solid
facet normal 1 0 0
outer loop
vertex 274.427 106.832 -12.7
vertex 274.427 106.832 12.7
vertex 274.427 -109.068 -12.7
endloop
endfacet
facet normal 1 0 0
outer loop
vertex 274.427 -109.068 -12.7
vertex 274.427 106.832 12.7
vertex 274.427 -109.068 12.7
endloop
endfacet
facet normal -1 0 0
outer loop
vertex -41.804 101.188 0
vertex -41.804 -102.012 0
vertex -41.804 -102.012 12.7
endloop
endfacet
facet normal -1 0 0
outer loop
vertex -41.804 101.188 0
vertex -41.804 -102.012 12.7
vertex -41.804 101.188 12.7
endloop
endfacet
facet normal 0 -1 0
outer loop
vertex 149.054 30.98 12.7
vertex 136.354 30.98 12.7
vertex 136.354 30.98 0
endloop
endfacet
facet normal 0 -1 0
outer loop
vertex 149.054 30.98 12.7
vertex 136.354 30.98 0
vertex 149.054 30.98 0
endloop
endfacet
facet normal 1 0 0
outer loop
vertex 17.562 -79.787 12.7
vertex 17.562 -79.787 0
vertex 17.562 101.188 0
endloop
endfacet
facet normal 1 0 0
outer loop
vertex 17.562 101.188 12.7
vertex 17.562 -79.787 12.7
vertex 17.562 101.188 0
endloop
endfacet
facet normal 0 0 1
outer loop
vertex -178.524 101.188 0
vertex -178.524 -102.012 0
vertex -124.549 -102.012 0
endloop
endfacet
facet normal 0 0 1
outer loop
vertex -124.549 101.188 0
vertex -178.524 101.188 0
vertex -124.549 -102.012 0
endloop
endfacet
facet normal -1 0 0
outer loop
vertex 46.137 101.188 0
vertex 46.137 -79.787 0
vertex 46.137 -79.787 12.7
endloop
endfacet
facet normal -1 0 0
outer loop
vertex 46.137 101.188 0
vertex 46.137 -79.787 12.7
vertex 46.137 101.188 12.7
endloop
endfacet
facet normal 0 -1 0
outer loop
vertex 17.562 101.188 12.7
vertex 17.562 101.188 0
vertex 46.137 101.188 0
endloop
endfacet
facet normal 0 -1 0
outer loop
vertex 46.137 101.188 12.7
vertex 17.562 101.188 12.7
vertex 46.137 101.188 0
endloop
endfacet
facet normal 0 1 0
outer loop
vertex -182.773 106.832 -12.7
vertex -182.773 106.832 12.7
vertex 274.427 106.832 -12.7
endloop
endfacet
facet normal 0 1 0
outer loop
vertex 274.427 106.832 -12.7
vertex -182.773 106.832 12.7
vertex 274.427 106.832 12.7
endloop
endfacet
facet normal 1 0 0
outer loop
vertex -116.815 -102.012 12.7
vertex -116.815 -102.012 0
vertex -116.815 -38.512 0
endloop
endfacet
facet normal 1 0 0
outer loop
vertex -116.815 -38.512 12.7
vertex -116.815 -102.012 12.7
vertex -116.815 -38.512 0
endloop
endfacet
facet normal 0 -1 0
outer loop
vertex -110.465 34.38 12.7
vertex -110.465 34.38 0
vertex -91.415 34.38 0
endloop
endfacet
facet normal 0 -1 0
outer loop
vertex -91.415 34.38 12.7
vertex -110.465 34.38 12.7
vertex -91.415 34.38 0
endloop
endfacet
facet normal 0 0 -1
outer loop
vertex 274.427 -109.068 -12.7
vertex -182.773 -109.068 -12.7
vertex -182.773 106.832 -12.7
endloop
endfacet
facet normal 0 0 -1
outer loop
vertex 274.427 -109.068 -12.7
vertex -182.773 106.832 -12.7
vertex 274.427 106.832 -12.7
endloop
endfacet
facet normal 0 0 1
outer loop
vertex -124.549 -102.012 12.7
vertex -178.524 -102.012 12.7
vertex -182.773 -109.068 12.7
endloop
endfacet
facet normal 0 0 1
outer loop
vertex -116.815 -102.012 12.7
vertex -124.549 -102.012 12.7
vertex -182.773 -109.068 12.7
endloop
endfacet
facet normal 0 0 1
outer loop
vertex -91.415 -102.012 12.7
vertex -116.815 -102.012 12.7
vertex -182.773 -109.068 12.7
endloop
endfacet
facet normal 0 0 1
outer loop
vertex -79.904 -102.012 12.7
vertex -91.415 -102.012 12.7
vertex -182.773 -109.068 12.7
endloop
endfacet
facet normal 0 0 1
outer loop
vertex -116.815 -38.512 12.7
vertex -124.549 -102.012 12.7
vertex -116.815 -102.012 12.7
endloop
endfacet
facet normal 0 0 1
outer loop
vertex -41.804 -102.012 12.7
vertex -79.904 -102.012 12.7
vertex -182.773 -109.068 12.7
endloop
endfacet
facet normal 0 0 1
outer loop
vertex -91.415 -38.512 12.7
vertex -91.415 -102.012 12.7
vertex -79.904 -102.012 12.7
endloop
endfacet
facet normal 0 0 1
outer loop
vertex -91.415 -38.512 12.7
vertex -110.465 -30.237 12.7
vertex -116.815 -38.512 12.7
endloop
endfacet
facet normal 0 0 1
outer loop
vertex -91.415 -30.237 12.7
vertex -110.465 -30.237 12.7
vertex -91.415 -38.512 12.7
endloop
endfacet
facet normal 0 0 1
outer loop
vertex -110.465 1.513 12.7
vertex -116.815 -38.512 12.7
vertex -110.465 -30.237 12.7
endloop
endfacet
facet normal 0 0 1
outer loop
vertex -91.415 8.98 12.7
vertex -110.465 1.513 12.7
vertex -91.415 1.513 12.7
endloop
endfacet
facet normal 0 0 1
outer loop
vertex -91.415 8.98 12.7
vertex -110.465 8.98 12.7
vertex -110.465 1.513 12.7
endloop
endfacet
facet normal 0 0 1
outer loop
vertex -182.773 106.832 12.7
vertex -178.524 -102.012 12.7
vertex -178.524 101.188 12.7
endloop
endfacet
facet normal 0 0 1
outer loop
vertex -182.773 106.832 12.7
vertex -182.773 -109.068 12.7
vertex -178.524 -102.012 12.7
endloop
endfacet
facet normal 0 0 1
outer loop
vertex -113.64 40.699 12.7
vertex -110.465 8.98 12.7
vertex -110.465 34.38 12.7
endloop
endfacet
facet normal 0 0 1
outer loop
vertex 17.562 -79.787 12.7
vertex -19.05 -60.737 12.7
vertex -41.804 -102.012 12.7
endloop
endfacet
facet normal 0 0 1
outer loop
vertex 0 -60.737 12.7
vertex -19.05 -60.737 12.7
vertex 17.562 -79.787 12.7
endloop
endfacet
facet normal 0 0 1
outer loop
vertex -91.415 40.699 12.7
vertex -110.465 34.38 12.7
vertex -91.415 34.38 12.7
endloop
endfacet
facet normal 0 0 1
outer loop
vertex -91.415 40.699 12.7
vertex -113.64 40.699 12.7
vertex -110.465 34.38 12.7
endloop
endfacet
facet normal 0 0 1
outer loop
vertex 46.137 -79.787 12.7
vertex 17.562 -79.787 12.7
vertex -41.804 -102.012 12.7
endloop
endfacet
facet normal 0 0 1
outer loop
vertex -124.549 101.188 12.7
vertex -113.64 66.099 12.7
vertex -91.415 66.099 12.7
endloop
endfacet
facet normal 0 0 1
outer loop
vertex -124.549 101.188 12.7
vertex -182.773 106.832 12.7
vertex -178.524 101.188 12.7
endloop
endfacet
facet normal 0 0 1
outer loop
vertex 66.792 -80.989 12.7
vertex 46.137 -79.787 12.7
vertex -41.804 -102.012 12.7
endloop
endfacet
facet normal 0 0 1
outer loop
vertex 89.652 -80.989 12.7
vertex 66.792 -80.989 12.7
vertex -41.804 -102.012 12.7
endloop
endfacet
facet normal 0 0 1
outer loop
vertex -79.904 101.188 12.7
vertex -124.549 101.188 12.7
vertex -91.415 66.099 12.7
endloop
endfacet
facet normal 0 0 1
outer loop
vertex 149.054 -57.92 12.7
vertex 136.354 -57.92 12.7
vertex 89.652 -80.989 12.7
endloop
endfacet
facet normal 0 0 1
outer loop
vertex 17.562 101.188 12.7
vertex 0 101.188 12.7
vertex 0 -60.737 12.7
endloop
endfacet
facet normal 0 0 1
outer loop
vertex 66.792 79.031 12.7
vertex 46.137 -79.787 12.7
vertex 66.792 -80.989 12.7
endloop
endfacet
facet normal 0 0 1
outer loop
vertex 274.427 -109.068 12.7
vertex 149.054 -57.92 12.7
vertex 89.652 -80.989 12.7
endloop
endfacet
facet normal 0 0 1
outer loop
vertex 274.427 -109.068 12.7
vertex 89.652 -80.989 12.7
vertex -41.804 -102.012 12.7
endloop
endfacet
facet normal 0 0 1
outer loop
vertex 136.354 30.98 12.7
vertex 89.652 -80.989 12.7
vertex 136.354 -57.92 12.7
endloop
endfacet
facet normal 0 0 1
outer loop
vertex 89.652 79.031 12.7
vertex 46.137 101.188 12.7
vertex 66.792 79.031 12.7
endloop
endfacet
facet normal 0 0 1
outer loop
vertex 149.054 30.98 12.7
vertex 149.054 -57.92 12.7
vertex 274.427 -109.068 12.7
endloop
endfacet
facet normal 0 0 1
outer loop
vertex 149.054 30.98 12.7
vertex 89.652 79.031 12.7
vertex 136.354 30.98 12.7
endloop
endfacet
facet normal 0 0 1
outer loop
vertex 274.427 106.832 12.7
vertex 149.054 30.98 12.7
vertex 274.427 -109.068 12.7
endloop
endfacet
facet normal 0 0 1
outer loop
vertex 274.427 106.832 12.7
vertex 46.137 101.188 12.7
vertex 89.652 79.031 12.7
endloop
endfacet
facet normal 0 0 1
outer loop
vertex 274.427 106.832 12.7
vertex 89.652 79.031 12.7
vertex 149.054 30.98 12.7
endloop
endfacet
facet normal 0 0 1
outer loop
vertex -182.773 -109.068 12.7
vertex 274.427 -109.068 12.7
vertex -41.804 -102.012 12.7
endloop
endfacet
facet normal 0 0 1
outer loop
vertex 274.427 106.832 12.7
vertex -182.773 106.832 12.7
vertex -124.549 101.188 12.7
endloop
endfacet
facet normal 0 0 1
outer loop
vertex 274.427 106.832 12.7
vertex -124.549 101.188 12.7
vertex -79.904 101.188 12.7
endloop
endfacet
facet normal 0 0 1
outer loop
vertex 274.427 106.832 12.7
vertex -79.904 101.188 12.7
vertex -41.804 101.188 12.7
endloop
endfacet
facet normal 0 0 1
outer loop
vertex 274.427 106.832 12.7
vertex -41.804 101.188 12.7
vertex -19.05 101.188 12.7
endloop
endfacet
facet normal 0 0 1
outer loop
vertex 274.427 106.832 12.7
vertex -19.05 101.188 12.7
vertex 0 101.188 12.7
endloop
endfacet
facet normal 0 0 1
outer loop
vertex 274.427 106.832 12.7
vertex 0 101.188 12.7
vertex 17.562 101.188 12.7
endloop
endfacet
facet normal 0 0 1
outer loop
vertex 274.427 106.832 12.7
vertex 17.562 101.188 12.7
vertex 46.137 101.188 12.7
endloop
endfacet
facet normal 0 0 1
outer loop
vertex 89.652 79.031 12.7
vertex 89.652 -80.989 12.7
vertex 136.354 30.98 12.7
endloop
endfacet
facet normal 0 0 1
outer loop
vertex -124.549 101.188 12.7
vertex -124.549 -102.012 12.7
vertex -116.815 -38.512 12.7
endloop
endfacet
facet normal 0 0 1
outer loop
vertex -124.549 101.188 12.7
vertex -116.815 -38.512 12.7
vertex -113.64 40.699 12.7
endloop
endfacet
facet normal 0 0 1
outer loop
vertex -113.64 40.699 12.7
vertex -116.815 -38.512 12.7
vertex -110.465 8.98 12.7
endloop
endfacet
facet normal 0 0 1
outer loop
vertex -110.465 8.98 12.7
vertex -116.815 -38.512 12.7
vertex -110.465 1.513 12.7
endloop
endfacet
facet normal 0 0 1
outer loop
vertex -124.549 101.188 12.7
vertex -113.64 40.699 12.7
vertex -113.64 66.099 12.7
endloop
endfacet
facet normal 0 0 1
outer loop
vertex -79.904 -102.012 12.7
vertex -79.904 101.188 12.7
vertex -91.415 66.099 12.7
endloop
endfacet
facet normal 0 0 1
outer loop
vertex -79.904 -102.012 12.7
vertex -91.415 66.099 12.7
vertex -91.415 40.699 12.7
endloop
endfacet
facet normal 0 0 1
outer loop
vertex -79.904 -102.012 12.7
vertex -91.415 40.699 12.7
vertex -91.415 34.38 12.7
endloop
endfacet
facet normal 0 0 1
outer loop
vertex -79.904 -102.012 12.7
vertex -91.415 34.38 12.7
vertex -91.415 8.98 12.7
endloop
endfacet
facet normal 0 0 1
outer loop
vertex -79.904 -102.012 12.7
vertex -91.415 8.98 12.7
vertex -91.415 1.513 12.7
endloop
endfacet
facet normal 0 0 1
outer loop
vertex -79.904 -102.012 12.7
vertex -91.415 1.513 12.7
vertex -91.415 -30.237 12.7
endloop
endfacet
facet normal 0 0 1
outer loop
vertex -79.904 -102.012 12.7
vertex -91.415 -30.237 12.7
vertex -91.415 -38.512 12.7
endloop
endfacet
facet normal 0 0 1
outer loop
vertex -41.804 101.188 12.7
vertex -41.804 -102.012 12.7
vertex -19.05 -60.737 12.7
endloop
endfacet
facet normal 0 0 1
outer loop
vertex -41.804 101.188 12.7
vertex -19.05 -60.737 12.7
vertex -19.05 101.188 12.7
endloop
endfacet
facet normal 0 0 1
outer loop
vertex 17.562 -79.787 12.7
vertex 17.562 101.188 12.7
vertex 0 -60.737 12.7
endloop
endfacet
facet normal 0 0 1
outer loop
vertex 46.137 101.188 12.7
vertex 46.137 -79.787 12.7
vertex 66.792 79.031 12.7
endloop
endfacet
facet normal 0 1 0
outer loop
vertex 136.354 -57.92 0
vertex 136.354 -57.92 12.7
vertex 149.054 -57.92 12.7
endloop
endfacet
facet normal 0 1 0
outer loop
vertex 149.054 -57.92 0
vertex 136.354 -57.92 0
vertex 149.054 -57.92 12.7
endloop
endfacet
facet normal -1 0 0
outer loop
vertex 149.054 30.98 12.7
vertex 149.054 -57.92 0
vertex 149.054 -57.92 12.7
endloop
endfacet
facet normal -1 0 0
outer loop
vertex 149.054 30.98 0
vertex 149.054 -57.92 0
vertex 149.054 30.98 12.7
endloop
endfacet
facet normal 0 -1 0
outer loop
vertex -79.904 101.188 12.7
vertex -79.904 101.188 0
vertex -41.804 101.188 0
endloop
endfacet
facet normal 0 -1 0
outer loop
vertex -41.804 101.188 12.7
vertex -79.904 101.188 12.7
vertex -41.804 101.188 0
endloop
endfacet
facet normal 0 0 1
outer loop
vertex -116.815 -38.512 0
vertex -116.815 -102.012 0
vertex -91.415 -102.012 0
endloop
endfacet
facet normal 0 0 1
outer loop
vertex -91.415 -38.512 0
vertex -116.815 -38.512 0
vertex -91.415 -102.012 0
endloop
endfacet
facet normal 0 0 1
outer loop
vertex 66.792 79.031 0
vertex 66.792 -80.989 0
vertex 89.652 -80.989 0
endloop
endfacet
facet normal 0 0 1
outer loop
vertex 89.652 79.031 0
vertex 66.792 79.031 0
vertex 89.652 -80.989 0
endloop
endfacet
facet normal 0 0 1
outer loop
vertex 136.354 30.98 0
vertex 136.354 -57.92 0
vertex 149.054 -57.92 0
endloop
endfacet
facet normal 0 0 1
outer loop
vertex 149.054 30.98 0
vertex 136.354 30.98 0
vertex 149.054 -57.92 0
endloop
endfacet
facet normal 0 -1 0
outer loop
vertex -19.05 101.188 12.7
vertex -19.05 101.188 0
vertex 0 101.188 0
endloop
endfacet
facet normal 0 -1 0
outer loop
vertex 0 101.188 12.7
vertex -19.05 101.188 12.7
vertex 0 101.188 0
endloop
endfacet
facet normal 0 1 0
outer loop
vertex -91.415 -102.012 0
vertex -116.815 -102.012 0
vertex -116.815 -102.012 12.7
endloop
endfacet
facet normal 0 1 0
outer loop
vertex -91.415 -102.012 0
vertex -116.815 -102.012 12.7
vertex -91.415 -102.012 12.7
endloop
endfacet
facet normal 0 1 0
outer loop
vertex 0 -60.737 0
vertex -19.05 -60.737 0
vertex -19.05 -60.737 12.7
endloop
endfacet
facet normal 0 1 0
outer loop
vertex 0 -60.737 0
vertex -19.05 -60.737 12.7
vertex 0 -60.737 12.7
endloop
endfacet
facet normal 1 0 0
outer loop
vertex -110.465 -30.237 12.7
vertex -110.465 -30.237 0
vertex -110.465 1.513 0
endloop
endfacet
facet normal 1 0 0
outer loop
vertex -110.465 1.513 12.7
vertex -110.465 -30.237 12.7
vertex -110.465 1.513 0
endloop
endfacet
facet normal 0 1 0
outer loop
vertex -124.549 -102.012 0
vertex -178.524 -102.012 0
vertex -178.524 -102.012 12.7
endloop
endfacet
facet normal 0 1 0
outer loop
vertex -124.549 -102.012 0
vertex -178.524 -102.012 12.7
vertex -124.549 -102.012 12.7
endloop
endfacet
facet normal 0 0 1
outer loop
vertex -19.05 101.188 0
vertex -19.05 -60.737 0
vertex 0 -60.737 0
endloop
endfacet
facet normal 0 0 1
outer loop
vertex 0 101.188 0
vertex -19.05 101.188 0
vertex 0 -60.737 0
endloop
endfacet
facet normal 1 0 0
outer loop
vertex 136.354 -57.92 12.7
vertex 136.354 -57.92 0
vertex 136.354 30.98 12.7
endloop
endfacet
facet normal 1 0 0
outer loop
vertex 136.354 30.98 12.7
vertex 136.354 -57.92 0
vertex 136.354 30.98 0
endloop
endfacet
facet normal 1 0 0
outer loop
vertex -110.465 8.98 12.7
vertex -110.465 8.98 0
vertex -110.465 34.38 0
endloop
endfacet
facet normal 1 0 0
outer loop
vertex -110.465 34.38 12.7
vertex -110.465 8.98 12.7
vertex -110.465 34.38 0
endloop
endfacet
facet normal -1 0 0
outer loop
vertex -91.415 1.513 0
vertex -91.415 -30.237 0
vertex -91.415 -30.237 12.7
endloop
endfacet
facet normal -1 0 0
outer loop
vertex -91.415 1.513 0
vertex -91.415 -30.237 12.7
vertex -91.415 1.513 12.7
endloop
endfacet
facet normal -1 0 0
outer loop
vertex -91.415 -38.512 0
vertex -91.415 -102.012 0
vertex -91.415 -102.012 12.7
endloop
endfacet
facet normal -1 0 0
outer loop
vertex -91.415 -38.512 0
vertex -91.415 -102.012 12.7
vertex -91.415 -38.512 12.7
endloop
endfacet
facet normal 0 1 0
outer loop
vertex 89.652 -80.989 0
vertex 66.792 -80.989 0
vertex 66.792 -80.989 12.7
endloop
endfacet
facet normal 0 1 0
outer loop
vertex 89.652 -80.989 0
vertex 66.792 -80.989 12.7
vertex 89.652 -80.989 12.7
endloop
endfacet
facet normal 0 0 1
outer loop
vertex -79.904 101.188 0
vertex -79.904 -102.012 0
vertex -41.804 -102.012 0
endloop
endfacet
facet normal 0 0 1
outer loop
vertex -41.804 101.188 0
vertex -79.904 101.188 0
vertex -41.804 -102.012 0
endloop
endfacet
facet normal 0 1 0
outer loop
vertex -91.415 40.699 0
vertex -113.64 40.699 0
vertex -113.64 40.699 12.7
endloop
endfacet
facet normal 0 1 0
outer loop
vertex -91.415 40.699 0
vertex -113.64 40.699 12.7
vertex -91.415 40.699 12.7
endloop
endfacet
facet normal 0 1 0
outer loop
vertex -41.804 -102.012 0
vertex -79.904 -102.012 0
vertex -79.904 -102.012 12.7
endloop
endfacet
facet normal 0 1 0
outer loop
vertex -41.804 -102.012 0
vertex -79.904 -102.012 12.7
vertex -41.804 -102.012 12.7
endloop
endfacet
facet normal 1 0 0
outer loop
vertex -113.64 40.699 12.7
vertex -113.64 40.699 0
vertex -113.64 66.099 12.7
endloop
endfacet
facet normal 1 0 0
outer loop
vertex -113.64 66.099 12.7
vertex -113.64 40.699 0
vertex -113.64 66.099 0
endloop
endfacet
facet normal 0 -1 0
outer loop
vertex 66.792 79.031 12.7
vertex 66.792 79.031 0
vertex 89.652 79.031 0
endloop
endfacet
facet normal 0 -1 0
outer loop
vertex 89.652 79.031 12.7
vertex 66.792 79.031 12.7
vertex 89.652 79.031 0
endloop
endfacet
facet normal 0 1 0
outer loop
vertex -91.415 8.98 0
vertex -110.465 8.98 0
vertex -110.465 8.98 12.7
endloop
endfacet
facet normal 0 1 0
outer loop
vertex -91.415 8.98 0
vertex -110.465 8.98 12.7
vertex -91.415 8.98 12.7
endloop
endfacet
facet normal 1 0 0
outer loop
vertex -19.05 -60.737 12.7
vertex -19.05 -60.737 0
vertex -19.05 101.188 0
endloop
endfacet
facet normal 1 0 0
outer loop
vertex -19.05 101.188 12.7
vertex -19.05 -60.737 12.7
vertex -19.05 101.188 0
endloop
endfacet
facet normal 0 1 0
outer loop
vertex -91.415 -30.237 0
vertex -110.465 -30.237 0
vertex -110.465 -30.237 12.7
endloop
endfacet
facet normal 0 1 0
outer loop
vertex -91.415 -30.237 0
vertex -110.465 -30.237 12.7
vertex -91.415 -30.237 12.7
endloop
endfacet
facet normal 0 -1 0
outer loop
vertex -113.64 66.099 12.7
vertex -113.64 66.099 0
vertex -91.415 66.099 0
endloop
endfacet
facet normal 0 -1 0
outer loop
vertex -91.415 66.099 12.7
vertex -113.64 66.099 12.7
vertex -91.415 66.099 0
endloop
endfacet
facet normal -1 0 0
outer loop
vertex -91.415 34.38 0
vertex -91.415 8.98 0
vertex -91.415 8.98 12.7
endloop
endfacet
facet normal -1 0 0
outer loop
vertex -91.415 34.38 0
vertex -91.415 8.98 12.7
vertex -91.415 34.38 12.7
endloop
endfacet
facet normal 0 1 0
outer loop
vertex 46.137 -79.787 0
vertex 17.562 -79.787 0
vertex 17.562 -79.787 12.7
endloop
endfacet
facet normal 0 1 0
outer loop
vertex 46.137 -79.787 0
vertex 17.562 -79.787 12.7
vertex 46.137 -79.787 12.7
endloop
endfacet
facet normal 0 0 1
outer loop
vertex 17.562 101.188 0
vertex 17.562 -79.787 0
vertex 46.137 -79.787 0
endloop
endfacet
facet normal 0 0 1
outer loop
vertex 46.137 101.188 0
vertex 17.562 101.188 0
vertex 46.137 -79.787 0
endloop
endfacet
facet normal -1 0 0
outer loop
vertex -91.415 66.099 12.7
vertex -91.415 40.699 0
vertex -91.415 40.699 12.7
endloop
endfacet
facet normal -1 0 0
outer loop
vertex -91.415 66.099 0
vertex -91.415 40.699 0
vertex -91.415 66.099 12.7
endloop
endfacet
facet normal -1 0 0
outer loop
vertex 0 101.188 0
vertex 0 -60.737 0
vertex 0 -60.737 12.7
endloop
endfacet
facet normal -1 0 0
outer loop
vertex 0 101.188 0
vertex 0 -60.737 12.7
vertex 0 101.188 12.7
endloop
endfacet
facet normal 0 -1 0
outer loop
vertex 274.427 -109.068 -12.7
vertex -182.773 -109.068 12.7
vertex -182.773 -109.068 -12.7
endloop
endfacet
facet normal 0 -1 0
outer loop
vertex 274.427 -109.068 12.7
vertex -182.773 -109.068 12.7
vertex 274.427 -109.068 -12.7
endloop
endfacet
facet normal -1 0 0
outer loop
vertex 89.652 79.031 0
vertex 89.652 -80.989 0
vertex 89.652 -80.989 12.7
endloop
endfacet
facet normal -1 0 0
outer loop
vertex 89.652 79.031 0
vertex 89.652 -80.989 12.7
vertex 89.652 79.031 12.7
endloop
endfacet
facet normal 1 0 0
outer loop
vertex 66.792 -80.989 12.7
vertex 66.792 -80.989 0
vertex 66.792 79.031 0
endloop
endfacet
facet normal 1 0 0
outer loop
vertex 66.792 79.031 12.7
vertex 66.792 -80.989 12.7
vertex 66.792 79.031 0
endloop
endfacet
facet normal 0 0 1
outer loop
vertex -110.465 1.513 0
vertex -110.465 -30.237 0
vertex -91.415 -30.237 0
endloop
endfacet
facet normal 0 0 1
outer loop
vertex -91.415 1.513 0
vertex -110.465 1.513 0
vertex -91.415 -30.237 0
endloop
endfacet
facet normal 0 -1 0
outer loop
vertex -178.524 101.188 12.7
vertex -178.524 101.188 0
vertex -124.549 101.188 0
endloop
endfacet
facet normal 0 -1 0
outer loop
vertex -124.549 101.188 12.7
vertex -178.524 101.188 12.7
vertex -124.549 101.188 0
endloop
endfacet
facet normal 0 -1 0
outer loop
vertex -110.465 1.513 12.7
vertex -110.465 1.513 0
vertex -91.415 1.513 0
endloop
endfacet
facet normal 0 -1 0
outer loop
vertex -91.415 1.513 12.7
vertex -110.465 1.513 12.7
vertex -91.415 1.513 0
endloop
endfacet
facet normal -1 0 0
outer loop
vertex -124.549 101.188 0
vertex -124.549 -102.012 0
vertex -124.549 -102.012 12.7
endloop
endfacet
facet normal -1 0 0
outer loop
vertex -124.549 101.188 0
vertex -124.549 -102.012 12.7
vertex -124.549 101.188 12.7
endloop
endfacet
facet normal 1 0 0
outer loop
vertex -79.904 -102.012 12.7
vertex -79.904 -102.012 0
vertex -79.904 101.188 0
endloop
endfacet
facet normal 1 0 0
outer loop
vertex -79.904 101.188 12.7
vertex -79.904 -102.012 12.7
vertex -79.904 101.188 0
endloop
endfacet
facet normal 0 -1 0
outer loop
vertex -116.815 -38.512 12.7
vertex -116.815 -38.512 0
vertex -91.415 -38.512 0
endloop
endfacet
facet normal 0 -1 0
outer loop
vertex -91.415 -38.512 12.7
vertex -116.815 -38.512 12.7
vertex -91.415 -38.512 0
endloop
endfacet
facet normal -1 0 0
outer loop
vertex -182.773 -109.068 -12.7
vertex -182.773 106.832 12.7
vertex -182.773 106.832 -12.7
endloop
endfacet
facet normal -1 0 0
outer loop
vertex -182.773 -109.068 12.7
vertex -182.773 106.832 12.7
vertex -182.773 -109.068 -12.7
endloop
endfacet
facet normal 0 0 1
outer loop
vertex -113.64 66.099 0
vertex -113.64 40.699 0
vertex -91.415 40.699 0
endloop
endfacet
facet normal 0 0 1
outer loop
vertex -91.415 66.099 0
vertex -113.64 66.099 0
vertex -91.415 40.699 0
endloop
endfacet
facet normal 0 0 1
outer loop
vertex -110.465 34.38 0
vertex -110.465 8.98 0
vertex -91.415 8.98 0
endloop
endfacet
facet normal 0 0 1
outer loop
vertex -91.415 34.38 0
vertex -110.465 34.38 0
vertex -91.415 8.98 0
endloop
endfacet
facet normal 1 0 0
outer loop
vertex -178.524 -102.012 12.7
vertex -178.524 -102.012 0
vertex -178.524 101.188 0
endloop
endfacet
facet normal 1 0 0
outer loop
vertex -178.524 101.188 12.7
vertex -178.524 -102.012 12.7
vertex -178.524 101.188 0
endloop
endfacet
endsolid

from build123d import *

# Parameters (mm, degrees)
F0_W     = 457.2
F0_H     = 215.9
F0_W_2   = 25.4
F0_H_2   = 63.5
F0_W_3   = 19.05
F0_H_3   = 31.75
F0_W_4   = 12.7
F0_H_4   = 88.9
F0_W_5   = 53.975
F0_H_5   = 203.2
F0_H_6   = 25.4
F0_W_6   = 38.1
F0_W_7   = 28.575
F0_H_7   = 180.975
F0_H_8   = 161.925
F0_W_8   = 22.225
F0_W_9   = 22.86
F0_H_9   = 160.02
F1_DEPTH = 12.7
F2_W     = 457.2
F2_H     = 215.9
F3_DEPTH = 12.7


with BuildPart() as f1:
    # F0 (on Top) → F1 (new body)
    with BuildSketch(Plane.XY):
        with Locations((45.826613, -1.118122)):
            Rectangle(F0_W, F0_H)
        with Locations((-104.114569, -70.262038)):
            Rectangle(F0_W_2, F0_H_2, mode=Mode.SUBTRACT)
        with Locations((-100.939569, -14.362427)):
            Rectangle(F0_W_3, F0_H_3, mode=Mode.SUBTRACT)
        with Locations((142.704006, -13.470057)):
            Rectangle(F0_W_4, F0_H_4, mode=Mode.SUBTRACT)
        with Locations((-151.536249, -0.412038)):
            Rectangle(F0_W_5, F0_H_5, mode=Mode.SUBTRACT)
        with Locations((-100.939569, 21.679631)):
            Rectangle(F0_W_3, F0_H_6, mode=Mode.SUBTRACT)
        with Locations((-60.8544, -0.412038)):
            Rectangle(F0_W_6, F0_H_5, mode=Mode.SUBTRACT)
        with Locations((31.849021, 10.700462)):
            Rectangle(F0_W_7, F0_H_7, mode=Mode.SUBTRACT)
        with Locations((-9.525, 20.225462)):
            Rectangle(F0_W_3, F0_H_8, mode=Mode.SUBTRACT)
        with Locations((-102.527069, 53.399307)):
            Rectangle(F0_W_8, F0_H_6, mode=Mode.SUBTRACT)
        with Locations((78.221696, -0.978914)):
            Rectangle(F0_W_9, F0_H_9, mode=Mode.SUBTRACT)
    extrude(amount=F1_DEPTH)

    # F2 (on face) → F3 (join)
    with BuildSketch(Plane(origin=(0, 0, 0), x_dir=(1, 0, 0), z_dir=(0, 0, -1))):
        with Locations((45.826613, 1.118122)):
            Rectangle(F2_W, F2_H)
    extrude(amount=F3_DEPTH)


solid = f1.part
